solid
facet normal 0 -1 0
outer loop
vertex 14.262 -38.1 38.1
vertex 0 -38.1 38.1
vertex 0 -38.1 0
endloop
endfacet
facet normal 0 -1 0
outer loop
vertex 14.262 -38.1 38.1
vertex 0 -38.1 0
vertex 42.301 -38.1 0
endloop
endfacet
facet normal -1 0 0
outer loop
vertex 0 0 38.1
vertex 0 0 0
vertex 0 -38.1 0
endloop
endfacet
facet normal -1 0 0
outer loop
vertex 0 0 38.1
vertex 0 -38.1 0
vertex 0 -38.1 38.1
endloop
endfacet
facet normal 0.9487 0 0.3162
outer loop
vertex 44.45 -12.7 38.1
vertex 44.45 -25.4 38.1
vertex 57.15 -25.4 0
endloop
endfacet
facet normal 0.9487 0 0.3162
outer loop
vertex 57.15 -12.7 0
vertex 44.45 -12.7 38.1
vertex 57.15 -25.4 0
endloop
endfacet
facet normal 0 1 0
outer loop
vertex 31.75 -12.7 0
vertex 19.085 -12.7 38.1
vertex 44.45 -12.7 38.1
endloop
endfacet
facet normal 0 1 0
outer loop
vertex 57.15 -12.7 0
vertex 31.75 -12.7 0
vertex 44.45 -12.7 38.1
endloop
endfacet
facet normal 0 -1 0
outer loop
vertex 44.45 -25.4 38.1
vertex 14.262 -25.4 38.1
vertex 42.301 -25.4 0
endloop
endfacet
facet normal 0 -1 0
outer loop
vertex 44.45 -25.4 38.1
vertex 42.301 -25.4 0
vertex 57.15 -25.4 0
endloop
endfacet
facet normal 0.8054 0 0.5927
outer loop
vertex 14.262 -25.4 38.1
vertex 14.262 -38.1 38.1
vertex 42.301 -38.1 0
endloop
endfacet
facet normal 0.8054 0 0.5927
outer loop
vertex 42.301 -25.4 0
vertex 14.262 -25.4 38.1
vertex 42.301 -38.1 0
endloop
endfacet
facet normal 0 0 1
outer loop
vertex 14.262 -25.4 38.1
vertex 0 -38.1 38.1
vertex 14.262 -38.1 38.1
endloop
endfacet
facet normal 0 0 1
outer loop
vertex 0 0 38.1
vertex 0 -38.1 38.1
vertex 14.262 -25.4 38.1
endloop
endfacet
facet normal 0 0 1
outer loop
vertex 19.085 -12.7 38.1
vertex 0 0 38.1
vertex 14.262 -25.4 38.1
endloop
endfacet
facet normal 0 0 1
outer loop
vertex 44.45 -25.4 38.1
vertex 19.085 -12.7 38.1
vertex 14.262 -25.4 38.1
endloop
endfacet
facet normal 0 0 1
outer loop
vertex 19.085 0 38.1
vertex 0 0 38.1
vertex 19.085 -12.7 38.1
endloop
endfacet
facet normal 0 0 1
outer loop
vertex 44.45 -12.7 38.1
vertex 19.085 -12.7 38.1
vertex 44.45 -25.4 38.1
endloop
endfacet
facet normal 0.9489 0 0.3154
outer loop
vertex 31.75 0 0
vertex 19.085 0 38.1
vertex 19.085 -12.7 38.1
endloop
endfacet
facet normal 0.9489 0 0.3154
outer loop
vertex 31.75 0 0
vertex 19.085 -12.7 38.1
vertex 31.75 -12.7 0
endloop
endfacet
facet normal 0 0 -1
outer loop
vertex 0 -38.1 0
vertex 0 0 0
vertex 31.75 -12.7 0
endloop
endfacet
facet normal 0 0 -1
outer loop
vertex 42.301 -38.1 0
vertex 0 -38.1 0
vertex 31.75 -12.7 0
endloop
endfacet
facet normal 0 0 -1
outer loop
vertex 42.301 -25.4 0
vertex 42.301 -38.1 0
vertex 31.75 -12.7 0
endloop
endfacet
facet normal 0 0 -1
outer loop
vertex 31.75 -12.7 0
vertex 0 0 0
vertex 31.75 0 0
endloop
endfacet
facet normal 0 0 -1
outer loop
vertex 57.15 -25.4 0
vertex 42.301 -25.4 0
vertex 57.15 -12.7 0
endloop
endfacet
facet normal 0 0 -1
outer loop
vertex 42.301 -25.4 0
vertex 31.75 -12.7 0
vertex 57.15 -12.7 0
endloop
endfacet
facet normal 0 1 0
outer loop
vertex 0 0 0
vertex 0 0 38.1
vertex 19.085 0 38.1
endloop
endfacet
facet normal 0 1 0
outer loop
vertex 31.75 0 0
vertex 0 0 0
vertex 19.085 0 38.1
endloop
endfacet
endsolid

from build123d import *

# Parameters (mm, degrees)
F0_W     = 57.15
F0_H     = 38.1
F1_DEPTH = 38.1
F3_DEPTH = 38.1
F5_DEPTH = 12.7
F9_DEPTH = 12.7


# Not quite as in the source:
# - a feature of the source that left no trace in its solid (it failed there, or was rolled back) is left out
# - a feature names something its author has since deleted; it is built from what else it names


with BuildPart() as f1:
    # F0 (on Front) → F1 (new body)
    with BuildSketch(Plane.XZ):
        with Locations((28.575, 19.05)):
            Rectangle(F0_W, F0_H)
    extrude(amount=F1_DEPTH)

    # F2 (on face) → F3 (cut)
    with BuildSketch(Plane.XZ.offset(38.1)):
        Polygon((57.15, 38.1), (44.45, 38.1), (57.15, 0), align=None)
    extrude(amount=-F3_DEPTH, mode=Mode.SUBTRACT)

    # F4 (on Front) → F5 (cut)
    with BuildSketch(Plane.XZ):
        Polygon((44.4645239406, 38.2572661593), (19.05, 38.2047749953), (31.75, 0), (57.1819730103, 0), align=None)
    extrude(amount=F5_DEPTH, mode=Mode.SUBTRACT)

    # F7 (on face) → F9 (cut)
    with BuildSketch(Plane.XZ.offset(38.1)):
        Polygon((44.45, 38.1), (14.2616005614, 38.1), (42.3013567924, 0), (57.15, 0), align=None)
    extrude(amount=-F9_DEPTH, mode=Mode.SUBTRACT)


solid = f1.part
